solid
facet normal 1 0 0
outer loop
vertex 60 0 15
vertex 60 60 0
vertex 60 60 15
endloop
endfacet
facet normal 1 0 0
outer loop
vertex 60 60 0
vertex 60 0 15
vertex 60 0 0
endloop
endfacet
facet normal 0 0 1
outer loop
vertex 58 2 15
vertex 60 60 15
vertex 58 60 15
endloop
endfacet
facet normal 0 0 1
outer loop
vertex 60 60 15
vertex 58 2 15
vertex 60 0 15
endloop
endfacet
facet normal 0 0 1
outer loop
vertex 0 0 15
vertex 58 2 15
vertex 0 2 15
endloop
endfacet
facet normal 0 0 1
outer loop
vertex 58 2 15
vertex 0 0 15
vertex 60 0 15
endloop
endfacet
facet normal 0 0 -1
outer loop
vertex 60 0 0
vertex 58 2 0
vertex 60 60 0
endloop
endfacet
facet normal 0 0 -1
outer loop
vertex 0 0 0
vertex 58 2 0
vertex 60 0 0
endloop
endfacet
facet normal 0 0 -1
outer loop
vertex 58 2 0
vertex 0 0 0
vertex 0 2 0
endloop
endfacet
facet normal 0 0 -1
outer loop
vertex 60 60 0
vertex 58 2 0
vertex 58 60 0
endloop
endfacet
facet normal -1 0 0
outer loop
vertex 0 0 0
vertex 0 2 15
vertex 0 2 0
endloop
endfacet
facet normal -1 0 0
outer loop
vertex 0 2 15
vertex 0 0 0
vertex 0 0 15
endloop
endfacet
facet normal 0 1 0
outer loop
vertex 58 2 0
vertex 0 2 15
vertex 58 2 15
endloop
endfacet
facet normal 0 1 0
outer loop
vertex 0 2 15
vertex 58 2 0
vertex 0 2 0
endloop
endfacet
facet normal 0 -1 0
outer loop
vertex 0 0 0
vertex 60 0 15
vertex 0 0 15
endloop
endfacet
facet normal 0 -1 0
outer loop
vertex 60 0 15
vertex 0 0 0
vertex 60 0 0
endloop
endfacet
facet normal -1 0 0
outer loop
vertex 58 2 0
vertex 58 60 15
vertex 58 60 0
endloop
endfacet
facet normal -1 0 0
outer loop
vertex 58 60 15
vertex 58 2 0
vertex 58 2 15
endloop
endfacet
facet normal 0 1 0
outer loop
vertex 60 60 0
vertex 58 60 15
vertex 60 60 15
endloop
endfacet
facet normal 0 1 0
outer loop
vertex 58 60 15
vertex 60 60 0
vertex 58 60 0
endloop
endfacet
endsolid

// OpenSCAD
cube([60, 2, 15]);
translate([60,0,0])
    rotate([0,0,90])
        cube([60,2,15]);
